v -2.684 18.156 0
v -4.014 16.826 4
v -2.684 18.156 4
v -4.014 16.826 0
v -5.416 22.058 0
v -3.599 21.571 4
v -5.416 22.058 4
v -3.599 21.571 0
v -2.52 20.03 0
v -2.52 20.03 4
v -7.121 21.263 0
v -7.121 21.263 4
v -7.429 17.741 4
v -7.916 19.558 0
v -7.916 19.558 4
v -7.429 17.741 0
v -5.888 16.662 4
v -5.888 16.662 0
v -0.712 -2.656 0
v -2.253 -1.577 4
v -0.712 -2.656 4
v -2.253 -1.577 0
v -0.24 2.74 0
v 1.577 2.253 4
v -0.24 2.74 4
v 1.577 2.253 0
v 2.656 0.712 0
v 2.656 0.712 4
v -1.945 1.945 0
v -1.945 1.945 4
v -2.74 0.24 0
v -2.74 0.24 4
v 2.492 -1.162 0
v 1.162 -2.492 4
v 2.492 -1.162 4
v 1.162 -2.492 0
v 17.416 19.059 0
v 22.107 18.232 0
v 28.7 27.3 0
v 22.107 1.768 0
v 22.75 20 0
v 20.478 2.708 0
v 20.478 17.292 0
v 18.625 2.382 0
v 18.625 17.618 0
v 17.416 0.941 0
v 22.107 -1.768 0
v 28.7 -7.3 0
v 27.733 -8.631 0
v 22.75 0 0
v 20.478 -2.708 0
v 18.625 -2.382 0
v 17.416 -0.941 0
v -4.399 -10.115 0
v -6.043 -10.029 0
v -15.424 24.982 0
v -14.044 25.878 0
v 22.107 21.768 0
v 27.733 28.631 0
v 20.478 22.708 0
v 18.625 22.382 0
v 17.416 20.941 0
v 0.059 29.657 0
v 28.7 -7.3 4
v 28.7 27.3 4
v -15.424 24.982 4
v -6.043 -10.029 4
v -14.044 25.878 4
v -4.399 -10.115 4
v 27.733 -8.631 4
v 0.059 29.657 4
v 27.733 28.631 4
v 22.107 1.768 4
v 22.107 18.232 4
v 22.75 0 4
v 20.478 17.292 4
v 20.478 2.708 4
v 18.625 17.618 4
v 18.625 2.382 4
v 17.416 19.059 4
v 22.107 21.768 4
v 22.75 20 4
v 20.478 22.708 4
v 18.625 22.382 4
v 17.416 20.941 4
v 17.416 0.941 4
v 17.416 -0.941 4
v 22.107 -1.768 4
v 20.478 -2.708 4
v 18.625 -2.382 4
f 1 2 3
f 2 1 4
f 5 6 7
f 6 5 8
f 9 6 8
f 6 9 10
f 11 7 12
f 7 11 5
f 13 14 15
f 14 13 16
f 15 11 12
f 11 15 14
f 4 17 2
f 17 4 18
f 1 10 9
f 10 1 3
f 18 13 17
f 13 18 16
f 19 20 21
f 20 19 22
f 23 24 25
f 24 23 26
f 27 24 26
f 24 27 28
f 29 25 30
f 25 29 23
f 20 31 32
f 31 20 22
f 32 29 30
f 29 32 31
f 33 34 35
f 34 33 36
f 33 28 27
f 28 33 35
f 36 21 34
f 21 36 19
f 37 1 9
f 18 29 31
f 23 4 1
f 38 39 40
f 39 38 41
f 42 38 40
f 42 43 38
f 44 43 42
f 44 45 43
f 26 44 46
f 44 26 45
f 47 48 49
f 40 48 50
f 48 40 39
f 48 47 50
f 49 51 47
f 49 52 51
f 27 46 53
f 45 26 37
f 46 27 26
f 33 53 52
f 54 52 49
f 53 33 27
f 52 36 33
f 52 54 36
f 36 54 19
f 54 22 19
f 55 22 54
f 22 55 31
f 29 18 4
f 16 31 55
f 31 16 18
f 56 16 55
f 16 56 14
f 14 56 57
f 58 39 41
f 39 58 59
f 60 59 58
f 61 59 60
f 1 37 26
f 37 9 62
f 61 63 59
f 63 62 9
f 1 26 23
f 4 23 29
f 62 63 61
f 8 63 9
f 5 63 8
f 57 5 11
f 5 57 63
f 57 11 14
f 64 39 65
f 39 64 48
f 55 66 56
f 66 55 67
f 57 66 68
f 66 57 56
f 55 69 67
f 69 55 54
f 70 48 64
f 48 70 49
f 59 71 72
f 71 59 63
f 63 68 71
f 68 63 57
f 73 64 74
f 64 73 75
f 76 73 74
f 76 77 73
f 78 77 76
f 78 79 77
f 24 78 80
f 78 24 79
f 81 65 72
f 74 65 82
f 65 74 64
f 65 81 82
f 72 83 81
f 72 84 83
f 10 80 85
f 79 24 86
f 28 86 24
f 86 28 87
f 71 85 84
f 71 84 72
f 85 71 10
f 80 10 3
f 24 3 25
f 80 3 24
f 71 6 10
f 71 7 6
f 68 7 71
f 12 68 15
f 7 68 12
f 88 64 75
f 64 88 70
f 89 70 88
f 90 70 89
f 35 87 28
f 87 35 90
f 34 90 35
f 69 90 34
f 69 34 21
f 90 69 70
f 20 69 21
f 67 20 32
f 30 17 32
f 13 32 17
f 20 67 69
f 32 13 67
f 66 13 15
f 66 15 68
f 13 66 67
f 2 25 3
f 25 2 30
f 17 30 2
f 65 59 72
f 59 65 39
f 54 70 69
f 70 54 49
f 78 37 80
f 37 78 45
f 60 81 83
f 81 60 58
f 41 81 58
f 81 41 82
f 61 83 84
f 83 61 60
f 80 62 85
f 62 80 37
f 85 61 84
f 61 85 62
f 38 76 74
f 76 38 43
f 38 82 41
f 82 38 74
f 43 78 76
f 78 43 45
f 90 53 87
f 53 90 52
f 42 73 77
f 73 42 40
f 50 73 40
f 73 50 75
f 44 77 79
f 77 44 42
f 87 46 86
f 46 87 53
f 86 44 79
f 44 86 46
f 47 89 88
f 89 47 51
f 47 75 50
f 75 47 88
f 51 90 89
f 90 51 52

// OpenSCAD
// rob@openpart.co.uk 20140202-02:02
// 4 hole joining plate for 20mm NOMINAL extrusion @ 15 degrees
// V-Slot & others

module roundedRect(size, radius) {
	x = size[0];
	y = size[1];
	z = size[2];
	linear_extrude(height=z)
	hull()
	{
		// place 4 circles in the corners, with the given radius
		translate([(-x/2)+(radius/2), (-y/2)+(radius/2), 0])
		circle(r=radius);
		translate([(x/2)-(radius/2), (-y/2)+(radius/2), 0])
		circle(r=radius);
		translate([(-x/2)+(radius/2), (y/2)-(radius/2), 0])
		circle(r=radius);
		translate([(x/2)-(radius/2), (y/2)-(radius/2), 0])
		circle(r=radius);
	}
}
angle = 15;
hole = 5.5 / 2;
plate_width = 36;
plate_length = 16;
plate_thickness = 4;
extend_past_thickness = 2;
corner_radius = 1.4;
difference() {
	hull () {
		rotate([0,0,angle]) {
			translate([0, 10, 0])
				roundedRect ([plate_length, plate_width, plate_thickness], corner_radius);
		}
		translate([20, 10, 0])
				roundedRect ([plate_length, plate_width, plate_thickness], corner_radius);
		}
		translate([20,20,-1])
			cylinder(h = (extend_past_thickness+plate_thickness+2), r = hole);
		translate([20,0,-1])
			cylinder(h = (extend_past_thickness+plate_thickness+2), r = hole);
		rotate([0,0,angle]) {
			translate([0,20,-1])
				cylinder(h = (extend_past_thickness+plate_thickness+2), r = hole);
			translate([0,0,-1])
				cylinder(h = (extend_past_thickness+plate_thickness+2), r = hole);
		}
}
